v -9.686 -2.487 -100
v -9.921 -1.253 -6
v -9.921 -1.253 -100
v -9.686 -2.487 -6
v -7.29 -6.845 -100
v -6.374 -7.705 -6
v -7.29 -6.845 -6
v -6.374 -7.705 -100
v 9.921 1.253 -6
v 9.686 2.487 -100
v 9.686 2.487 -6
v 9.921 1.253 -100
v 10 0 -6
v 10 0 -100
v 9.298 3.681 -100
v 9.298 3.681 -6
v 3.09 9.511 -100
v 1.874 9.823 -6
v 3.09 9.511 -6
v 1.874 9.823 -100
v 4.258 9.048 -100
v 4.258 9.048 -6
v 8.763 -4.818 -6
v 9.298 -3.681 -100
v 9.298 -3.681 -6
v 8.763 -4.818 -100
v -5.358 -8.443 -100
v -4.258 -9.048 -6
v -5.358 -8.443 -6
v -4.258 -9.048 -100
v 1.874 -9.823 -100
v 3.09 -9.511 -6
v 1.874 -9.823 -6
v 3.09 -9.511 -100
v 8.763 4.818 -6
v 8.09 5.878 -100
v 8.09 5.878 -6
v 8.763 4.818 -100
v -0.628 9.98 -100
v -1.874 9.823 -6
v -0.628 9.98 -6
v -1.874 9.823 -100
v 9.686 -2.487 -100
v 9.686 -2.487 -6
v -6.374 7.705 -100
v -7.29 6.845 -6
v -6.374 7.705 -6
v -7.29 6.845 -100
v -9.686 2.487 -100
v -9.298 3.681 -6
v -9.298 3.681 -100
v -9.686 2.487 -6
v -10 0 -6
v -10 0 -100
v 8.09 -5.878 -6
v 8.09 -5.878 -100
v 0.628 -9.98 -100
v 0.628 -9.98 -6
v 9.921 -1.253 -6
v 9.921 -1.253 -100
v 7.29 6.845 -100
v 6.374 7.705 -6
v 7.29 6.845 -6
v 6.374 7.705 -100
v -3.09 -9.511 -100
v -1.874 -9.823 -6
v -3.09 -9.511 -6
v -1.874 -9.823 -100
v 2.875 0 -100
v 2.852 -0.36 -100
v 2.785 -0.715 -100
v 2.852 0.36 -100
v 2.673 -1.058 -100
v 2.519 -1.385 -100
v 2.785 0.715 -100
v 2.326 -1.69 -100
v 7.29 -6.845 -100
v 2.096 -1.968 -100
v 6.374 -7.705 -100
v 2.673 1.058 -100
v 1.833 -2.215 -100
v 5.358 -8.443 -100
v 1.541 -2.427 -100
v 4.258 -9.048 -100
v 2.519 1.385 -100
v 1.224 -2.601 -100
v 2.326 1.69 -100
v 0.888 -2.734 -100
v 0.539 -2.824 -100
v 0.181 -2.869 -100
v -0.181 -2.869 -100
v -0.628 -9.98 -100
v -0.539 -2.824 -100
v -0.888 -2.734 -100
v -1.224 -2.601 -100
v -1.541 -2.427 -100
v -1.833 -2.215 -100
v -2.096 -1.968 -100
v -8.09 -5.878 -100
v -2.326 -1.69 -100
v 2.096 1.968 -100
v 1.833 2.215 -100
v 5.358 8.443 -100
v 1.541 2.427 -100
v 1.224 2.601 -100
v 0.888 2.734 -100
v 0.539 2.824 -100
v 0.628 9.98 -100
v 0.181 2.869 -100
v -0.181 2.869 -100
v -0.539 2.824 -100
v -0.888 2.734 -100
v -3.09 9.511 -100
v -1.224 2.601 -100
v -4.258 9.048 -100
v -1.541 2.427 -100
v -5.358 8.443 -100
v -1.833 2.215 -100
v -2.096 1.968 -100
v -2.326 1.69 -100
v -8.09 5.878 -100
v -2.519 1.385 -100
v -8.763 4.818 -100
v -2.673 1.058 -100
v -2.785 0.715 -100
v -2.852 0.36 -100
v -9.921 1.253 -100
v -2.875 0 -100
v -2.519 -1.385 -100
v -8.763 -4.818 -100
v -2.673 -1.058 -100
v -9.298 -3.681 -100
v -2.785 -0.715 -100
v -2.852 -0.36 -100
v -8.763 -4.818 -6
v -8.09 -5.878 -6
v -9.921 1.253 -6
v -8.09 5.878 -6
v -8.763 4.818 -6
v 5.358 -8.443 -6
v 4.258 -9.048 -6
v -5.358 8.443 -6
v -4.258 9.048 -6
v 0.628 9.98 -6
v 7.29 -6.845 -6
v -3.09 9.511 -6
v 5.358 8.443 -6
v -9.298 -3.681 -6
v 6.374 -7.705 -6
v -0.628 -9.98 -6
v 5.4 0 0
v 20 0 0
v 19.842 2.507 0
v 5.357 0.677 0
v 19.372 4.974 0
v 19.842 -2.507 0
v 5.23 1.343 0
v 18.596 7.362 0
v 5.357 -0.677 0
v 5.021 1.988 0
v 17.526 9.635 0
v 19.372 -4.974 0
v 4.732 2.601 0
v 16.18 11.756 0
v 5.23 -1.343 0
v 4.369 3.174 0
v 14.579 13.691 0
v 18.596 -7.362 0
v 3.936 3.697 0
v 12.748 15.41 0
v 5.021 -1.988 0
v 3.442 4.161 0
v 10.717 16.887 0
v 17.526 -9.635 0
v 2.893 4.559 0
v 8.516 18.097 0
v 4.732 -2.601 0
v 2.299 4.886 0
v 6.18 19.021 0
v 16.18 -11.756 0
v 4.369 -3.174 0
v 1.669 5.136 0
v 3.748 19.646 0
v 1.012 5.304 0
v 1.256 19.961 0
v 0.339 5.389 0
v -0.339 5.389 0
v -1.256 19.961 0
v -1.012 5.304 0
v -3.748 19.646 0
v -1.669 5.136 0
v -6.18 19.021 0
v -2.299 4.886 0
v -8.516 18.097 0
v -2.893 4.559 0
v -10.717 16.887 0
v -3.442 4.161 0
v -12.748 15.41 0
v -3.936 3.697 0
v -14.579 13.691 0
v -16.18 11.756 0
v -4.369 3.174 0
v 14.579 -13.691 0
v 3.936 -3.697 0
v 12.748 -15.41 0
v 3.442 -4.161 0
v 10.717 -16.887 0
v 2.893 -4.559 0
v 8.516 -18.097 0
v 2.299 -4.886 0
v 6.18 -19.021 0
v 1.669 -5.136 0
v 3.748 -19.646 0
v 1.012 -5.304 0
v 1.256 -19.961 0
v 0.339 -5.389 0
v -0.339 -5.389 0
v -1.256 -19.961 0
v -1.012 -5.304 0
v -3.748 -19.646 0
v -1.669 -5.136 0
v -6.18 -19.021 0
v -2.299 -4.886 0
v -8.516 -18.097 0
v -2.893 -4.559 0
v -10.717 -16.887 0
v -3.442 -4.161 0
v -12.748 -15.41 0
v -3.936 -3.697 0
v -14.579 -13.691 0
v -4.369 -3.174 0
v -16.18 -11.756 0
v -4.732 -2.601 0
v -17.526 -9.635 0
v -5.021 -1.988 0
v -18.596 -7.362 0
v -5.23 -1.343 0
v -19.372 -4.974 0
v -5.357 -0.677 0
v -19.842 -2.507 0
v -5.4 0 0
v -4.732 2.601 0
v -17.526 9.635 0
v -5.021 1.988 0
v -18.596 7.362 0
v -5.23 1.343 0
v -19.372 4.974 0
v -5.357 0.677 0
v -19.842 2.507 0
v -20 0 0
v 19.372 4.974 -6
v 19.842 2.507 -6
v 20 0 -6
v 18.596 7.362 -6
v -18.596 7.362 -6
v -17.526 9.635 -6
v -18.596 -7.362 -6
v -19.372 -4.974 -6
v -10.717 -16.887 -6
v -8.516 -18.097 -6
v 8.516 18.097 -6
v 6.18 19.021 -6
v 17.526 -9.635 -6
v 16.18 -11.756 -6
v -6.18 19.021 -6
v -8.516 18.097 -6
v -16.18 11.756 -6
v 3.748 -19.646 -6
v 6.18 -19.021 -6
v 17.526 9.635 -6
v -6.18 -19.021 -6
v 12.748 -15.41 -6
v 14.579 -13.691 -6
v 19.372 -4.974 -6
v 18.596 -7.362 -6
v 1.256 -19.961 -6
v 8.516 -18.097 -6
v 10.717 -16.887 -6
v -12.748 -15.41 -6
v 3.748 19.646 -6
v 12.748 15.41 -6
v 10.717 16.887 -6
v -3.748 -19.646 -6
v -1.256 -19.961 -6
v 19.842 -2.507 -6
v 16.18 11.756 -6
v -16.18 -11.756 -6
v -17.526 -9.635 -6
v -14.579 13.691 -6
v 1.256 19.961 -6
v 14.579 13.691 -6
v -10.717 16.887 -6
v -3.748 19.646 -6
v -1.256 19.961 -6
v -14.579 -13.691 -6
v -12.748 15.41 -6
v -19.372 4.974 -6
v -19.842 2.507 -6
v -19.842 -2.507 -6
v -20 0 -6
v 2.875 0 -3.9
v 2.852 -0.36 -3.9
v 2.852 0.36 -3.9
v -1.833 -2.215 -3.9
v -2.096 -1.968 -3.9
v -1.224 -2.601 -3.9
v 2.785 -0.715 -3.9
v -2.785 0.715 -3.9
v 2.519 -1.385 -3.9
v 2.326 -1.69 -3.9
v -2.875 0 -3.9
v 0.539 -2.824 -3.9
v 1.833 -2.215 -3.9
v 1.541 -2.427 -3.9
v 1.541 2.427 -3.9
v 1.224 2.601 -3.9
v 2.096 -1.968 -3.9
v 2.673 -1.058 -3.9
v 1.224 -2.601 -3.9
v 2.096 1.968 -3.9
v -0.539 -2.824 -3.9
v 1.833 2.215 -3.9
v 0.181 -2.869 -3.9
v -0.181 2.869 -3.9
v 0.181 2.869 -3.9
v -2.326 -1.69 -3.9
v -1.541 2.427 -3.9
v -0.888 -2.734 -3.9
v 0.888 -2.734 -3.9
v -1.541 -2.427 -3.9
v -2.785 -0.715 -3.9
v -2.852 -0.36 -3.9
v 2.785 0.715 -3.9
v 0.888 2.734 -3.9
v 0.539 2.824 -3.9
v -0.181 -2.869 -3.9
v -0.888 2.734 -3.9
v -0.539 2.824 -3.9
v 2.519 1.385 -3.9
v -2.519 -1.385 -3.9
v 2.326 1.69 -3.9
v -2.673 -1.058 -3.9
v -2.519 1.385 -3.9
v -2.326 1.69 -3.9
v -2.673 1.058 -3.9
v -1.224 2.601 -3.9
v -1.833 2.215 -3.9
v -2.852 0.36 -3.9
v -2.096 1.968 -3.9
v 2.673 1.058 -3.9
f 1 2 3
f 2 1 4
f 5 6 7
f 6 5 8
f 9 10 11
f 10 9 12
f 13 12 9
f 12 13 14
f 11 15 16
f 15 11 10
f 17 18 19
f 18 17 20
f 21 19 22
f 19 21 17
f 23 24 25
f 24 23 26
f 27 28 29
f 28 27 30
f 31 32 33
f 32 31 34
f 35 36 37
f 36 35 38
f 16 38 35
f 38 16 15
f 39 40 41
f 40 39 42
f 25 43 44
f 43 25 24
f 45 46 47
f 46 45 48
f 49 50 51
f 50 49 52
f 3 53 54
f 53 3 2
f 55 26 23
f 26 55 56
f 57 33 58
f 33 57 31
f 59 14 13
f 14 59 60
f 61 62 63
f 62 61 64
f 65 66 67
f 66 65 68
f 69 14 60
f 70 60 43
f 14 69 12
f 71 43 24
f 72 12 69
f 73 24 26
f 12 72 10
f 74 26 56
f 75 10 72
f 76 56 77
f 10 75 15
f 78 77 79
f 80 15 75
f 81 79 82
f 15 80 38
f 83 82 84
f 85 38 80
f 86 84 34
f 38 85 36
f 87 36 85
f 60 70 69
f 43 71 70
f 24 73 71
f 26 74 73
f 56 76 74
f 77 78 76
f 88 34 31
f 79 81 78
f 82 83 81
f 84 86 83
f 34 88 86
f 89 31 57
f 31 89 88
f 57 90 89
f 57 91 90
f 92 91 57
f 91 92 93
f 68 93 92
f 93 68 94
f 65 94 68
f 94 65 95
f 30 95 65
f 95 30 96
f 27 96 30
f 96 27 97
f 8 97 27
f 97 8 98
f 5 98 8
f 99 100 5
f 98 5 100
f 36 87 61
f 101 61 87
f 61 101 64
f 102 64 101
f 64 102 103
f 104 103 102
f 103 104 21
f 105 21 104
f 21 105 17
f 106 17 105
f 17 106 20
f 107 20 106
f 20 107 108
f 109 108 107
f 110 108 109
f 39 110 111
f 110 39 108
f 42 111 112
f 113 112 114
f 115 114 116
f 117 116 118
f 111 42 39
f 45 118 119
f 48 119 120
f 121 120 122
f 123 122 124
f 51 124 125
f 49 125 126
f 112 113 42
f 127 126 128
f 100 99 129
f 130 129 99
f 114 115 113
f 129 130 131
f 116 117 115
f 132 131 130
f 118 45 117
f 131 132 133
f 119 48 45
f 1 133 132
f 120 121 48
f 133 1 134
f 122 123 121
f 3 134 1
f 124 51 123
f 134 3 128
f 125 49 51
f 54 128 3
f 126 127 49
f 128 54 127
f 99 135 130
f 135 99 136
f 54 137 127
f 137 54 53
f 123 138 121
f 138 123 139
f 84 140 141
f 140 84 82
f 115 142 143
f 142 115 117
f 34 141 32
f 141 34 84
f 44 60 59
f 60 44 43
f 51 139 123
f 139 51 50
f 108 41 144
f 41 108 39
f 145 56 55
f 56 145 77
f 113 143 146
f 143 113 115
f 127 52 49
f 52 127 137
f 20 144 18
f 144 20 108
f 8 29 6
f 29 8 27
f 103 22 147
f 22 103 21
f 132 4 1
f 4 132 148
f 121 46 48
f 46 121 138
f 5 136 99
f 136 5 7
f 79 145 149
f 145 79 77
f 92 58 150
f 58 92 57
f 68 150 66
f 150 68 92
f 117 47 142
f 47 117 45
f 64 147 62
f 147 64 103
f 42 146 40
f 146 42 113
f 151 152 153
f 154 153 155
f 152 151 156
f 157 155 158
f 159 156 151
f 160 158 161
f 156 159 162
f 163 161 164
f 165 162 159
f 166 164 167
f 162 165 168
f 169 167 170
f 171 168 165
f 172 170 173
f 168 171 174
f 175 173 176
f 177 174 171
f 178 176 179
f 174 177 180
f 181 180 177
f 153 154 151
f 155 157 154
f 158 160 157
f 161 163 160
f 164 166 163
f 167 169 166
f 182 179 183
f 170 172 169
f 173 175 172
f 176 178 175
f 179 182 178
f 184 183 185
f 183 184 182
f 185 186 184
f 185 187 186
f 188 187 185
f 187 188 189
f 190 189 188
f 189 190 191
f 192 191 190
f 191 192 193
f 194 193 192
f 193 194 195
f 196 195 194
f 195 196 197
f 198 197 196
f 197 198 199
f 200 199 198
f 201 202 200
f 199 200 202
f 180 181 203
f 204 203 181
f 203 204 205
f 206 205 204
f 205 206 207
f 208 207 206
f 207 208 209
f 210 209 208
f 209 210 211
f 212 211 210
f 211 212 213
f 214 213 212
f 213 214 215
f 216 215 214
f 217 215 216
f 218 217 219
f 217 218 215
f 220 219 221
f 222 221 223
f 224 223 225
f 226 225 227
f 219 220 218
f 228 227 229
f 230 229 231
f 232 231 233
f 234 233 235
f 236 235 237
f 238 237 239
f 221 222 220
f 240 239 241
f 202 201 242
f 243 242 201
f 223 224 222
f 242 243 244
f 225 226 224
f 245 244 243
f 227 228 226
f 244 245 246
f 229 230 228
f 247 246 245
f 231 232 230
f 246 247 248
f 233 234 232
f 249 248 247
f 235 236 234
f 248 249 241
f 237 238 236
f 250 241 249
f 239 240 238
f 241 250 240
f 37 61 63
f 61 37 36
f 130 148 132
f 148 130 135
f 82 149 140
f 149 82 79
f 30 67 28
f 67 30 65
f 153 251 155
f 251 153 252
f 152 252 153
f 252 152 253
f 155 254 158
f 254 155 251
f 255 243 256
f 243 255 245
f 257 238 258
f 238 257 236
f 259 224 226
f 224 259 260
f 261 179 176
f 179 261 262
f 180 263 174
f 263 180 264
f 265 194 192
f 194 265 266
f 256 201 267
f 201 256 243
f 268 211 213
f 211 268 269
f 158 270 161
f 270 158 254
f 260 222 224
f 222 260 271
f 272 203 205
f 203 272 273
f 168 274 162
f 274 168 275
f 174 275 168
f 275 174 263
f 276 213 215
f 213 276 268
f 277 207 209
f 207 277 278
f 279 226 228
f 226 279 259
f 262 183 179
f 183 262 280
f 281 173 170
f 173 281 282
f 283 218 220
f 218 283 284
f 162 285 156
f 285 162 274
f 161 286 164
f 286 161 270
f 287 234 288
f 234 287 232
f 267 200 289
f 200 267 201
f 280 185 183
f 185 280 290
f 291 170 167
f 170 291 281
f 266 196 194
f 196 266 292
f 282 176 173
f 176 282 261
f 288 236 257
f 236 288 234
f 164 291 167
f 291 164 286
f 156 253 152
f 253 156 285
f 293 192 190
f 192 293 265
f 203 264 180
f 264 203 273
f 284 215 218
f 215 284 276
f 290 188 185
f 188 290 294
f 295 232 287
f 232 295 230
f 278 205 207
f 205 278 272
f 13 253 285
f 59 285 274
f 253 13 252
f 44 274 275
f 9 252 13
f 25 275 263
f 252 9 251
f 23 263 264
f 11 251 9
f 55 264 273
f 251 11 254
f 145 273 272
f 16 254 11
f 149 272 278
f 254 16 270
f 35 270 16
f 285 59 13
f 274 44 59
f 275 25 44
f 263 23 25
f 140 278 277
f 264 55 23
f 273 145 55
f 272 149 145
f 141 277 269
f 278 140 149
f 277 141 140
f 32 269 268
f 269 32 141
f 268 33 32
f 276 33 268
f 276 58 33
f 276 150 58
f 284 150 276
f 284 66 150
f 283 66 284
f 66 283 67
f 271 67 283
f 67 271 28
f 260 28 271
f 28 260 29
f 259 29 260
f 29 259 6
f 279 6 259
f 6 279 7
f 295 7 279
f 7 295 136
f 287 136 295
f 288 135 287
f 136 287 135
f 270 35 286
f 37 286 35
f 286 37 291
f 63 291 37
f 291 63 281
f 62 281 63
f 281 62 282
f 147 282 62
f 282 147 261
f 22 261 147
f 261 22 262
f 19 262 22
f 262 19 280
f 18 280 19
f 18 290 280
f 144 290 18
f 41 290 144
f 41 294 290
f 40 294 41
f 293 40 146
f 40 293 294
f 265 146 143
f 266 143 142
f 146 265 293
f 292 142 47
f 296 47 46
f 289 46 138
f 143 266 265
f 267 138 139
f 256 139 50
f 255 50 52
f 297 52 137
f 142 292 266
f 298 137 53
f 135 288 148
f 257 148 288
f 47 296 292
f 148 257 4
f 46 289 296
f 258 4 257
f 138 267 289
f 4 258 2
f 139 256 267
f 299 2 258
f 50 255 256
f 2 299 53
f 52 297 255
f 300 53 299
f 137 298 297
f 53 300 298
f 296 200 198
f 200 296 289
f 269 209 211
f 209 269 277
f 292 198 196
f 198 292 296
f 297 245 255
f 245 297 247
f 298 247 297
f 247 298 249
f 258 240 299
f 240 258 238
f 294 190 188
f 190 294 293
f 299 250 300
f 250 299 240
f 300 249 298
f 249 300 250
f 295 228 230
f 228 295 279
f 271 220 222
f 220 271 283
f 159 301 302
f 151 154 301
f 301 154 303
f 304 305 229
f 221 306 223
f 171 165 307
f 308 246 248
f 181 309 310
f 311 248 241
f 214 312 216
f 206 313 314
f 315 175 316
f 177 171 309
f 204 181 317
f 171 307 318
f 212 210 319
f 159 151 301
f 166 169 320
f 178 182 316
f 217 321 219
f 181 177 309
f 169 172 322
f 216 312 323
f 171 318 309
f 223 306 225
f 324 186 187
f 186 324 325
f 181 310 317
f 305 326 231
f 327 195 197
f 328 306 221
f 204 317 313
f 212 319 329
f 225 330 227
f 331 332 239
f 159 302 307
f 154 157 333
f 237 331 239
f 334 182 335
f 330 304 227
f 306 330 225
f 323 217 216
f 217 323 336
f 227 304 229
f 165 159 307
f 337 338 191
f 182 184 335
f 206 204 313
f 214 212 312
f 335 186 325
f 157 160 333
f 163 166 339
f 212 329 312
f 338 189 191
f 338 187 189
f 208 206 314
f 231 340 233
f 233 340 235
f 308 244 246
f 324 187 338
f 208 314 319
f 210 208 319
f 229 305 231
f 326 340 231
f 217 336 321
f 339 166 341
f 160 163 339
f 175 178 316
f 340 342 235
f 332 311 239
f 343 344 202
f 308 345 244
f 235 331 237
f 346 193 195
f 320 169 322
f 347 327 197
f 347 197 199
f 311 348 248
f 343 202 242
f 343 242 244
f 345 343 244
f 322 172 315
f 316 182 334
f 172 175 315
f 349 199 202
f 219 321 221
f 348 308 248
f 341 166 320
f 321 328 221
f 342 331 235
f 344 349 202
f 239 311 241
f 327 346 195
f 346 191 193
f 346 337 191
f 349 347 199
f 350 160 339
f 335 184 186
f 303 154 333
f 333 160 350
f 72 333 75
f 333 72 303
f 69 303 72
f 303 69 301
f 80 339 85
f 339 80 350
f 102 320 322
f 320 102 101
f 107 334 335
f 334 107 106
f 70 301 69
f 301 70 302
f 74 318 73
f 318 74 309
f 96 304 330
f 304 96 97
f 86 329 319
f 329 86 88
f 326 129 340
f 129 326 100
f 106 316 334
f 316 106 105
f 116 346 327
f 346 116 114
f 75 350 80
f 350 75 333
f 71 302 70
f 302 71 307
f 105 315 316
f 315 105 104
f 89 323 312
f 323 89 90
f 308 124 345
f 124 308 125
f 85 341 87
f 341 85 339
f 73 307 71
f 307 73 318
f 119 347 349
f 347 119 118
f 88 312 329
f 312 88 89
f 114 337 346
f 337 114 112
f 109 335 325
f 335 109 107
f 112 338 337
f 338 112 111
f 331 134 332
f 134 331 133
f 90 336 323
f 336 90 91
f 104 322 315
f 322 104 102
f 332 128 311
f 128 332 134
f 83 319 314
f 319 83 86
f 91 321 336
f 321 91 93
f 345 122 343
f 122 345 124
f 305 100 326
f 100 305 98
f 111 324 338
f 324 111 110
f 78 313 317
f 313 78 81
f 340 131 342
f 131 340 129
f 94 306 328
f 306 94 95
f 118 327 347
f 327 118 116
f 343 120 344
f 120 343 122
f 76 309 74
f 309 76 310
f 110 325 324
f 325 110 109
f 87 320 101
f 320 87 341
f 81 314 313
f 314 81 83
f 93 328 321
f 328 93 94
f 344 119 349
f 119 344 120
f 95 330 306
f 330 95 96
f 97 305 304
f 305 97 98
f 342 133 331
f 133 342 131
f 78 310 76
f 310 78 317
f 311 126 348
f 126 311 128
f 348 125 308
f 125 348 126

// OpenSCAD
$fn = 50;


difference() {
	union() {
		translate(v = [0, 0, -100.0000000000]) {
			cylinder(h = 100, r = 10.0000000000);
		}
		translate(v = [0, 0, -6.0000000000]) {
			cylinder(h = 6, r = 20.0000000000);
		}
	}
	union() {
		translate(v = [0, 0, 0]) {
			rotate(a = [0, 0, 0]) {
				difference() {
					union() {
						#translate(v = [0, 0, -100.0000000000]) {
							cylinder(h = 100, r = 2.6000000000);
						}
						#translate(v = [0, 0, -3.9000000000]) {
							cylinder(h = 3.9000000000, r = 10.0000000000, r1 = 2.8750000000, r2 = 5.4000000000);
						}
						#translate(v = [0, 0, -100.0000000000]) {
							cylinder(h = 100, r = 2.8750000000);
						}
						#translate(v = [0, 0, -100.0000000000]) {
							cylinder(h = 100, r = 2.6000000000);
						}
					}
					union();
				}
			}
		}
	}
}
